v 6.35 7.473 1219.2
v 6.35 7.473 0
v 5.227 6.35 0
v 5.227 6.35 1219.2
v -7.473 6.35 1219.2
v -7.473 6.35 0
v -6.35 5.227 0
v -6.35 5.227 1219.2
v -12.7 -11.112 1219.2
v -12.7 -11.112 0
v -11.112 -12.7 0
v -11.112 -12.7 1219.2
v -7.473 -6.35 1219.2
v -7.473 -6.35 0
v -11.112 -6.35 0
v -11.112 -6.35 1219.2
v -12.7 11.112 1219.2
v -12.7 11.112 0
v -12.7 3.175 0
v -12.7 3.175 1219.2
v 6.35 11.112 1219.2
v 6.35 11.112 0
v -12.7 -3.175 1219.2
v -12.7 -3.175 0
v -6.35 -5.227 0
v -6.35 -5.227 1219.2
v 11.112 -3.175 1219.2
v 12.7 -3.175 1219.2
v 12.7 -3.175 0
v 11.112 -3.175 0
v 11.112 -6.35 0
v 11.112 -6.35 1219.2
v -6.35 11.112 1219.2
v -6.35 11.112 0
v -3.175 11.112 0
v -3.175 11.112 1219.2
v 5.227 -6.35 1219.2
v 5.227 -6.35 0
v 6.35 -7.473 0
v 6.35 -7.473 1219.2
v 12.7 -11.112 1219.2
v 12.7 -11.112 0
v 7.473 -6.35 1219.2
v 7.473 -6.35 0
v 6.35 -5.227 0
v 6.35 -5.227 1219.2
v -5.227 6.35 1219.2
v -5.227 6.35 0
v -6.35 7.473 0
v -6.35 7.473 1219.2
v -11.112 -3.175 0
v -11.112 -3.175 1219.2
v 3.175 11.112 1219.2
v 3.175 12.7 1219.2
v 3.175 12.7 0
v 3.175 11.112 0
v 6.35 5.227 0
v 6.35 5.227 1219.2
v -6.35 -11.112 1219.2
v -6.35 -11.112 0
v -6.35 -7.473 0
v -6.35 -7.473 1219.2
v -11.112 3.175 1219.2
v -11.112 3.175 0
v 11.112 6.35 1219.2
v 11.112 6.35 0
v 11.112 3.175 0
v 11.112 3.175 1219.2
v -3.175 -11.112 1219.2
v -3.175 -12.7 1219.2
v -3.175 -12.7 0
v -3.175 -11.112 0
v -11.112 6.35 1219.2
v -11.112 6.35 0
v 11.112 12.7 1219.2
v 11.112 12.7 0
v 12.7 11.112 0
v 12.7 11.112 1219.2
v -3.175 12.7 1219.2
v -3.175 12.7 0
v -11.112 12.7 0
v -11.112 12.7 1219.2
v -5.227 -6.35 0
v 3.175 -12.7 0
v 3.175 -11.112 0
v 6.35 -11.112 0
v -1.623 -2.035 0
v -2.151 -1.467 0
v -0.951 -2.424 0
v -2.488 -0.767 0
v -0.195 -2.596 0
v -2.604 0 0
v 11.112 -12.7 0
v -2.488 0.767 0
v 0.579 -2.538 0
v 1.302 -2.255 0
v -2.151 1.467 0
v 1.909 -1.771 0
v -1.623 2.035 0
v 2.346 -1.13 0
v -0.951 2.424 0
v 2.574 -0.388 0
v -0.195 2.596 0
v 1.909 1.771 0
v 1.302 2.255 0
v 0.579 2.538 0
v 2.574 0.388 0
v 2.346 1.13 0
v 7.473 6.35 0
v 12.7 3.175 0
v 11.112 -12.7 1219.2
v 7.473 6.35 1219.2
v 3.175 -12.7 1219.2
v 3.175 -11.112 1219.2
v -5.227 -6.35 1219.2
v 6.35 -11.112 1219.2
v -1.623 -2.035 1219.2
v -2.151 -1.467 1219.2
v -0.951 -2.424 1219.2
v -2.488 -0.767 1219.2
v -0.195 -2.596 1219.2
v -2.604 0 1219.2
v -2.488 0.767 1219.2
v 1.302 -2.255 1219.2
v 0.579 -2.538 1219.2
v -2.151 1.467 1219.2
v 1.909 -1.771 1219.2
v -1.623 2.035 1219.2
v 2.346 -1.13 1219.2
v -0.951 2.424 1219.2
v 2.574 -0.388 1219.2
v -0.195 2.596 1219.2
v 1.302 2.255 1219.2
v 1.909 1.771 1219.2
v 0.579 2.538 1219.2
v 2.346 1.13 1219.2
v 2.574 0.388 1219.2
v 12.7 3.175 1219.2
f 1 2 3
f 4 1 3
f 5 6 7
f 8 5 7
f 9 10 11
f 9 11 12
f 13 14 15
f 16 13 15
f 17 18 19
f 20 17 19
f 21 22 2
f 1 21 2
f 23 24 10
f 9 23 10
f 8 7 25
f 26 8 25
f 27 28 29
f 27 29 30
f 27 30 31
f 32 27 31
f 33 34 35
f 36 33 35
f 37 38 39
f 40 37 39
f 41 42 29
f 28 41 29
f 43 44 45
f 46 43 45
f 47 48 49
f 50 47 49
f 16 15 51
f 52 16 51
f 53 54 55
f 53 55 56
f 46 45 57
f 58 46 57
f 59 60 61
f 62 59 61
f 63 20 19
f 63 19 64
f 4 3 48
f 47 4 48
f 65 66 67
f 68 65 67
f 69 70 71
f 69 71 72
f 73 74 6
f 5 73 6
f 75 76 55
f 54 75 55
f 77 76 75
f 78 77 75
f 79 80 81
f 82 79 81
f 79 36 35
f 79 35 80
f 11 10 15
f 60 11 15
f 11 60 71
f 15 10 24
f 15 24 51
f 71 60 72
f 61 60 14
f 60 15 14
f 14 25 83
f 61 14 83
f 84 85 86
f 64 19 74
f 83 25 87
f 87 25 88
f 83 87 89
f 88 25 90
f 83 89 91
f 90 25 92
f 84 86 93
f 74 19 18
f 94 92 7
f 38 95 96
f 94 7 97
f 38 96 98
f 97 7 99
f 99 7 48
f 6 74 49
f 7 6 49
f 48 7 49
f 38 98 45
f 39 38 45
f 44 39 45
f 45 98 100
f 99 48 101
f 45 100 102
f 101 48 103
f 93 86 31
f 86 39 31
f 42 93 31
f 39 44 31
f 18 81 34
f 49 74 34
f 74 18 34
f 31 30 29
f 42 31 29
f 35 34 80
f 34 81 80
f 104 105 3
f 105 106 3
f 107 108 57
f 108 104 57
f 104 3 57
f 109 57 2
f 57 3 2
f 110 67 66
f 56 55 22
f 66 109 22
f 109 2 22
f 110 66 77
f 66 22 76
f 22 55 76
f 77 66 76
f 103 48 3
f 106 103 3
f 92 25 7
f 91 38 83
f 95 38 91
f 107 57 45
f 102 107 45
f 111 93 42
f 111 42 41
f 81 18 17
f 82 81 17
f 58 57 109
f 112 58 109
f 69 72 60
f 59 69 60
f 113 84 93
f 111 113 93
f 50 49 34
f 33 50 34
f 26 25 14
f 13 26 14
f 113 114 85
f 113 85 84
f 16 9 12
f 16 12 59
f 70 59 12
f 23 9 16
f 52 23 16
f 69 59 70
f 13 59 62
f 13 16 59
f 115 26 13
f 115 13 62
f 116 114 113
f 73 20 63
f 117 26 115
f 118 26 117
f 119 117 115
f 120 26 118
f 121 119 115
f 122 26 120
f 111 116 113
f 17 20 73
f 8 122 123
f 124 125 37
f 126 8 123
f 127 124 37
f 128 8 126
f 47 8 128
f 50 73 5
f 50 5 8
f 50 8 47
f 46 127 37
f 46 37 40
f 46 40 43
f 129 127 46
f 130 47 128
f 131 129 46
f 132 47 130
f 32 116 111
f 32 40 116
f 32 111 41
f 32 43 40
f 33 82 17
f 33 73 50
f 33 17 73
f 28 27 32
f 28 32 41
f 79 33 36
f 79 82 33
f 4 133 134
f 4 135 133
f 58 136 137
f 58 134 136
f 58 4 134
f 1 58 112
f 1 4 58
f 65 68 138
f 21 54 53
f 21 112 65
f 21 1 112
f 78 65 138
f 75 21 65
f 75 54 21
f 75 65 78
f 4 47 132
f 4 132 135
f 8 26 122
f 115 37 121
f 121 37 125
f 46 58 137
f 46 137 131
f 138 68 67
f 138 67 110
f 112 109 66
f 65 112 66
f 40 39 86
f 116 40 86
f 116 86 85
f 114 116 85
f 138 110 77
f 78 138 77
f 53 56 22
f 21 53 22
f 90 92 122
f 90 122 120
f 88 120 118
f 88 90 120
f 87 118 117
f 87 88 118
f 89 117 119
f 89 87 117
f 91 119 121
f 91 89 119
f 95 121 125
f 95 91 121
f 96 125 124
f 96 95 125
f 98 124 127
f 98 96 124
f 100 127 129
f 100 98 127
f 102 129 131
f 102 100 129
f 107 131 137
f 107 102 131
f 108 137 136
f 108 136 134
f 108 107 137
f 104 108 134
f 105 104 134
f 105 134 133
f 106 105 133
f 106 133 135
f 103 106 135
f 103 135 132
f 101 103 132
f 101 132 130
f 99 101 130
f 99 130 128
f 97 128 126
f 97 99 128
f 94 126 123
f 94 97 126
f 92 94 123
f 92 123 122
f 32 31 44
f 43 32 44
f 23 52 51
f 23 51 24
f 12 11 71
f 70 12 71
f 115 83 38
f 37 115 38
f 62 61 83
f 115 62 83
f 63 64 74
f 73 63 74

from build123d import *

# Parameters (mm, degrees)
SKETCH1_R      = 2.6035
EXTRUDE1_DEPTH = 1219.2
CHAMFER1_SIZE  = 1.5875


with BuildPart() as part:
    # Sketch1 → Extrude1 (new body)
    with BuildSketch(Plane.XY):
        Polygon((12.7, 3.175), (12.7, 12.7), (3.175, 12.7), (3.175, 11.1125), (6.35, 11.1125), (6.35, 7.472532015), (5.227467985, 6.35), (-5.227467985, 6.35), (-6.35, 7.472532015), (-6.35, 11.1125), (-3.175, 11.1125), (-3.175, 12.7), (-12.7, 12.7), (-12.7, 3.175), (-11.1125, 3.175), (-11.1125, 6.35), (-7.472532015, 6.35), (-6.35, 5.227467985), (-6.35, -5.227467985), (-7.472532015, -6.35), (-11.1125, -6.35), (-11.1125, -3.175), (-12.7, -3.175), (-12.7, -12.7), (-3.175, -12.7), (-3.175, -11.1125), (-6.35, -11.1125), (-6.35, -7.472532015), (-5.227467985, -6.35), (5.227467985, -6.35), (6.35, -7.472532015), (6.35, -11.1125), (3.175, -11.1125), (3.175, -12.7), (12.7, -12.7), (12.7, -3.175), (11.1125, -3.175), (11.1125, -6.35), (7.472532015, -6.35), (6.35, -5.227467985), (6.35, 5.227467985), (7.472532015, 6.35), (11.1125, 6.35), (11.1125, 3.175), align=None)
        with Locations(Location((0, 0, 0), (0, 0, 180))):
            Circle(SKETCH1_R, mode=Mode.SUBTRACT)
    extrude(amount=EXTRUDE1_DEPTH)

    # Chamfer1
    chamfer1_edges = [part.edges().sort_by_distance(p)[0] for p in [
        (12.7, -12.7, 609.6),
        (-12.7, -12.7, 609.6),
        (-12.7, 12.7, 609.6),
        (12.7, 12.7, 609.6),
    ]]
    chamfer(chamfer1_edges, length=CHAMFER1_SIZE)


solid = part.part
